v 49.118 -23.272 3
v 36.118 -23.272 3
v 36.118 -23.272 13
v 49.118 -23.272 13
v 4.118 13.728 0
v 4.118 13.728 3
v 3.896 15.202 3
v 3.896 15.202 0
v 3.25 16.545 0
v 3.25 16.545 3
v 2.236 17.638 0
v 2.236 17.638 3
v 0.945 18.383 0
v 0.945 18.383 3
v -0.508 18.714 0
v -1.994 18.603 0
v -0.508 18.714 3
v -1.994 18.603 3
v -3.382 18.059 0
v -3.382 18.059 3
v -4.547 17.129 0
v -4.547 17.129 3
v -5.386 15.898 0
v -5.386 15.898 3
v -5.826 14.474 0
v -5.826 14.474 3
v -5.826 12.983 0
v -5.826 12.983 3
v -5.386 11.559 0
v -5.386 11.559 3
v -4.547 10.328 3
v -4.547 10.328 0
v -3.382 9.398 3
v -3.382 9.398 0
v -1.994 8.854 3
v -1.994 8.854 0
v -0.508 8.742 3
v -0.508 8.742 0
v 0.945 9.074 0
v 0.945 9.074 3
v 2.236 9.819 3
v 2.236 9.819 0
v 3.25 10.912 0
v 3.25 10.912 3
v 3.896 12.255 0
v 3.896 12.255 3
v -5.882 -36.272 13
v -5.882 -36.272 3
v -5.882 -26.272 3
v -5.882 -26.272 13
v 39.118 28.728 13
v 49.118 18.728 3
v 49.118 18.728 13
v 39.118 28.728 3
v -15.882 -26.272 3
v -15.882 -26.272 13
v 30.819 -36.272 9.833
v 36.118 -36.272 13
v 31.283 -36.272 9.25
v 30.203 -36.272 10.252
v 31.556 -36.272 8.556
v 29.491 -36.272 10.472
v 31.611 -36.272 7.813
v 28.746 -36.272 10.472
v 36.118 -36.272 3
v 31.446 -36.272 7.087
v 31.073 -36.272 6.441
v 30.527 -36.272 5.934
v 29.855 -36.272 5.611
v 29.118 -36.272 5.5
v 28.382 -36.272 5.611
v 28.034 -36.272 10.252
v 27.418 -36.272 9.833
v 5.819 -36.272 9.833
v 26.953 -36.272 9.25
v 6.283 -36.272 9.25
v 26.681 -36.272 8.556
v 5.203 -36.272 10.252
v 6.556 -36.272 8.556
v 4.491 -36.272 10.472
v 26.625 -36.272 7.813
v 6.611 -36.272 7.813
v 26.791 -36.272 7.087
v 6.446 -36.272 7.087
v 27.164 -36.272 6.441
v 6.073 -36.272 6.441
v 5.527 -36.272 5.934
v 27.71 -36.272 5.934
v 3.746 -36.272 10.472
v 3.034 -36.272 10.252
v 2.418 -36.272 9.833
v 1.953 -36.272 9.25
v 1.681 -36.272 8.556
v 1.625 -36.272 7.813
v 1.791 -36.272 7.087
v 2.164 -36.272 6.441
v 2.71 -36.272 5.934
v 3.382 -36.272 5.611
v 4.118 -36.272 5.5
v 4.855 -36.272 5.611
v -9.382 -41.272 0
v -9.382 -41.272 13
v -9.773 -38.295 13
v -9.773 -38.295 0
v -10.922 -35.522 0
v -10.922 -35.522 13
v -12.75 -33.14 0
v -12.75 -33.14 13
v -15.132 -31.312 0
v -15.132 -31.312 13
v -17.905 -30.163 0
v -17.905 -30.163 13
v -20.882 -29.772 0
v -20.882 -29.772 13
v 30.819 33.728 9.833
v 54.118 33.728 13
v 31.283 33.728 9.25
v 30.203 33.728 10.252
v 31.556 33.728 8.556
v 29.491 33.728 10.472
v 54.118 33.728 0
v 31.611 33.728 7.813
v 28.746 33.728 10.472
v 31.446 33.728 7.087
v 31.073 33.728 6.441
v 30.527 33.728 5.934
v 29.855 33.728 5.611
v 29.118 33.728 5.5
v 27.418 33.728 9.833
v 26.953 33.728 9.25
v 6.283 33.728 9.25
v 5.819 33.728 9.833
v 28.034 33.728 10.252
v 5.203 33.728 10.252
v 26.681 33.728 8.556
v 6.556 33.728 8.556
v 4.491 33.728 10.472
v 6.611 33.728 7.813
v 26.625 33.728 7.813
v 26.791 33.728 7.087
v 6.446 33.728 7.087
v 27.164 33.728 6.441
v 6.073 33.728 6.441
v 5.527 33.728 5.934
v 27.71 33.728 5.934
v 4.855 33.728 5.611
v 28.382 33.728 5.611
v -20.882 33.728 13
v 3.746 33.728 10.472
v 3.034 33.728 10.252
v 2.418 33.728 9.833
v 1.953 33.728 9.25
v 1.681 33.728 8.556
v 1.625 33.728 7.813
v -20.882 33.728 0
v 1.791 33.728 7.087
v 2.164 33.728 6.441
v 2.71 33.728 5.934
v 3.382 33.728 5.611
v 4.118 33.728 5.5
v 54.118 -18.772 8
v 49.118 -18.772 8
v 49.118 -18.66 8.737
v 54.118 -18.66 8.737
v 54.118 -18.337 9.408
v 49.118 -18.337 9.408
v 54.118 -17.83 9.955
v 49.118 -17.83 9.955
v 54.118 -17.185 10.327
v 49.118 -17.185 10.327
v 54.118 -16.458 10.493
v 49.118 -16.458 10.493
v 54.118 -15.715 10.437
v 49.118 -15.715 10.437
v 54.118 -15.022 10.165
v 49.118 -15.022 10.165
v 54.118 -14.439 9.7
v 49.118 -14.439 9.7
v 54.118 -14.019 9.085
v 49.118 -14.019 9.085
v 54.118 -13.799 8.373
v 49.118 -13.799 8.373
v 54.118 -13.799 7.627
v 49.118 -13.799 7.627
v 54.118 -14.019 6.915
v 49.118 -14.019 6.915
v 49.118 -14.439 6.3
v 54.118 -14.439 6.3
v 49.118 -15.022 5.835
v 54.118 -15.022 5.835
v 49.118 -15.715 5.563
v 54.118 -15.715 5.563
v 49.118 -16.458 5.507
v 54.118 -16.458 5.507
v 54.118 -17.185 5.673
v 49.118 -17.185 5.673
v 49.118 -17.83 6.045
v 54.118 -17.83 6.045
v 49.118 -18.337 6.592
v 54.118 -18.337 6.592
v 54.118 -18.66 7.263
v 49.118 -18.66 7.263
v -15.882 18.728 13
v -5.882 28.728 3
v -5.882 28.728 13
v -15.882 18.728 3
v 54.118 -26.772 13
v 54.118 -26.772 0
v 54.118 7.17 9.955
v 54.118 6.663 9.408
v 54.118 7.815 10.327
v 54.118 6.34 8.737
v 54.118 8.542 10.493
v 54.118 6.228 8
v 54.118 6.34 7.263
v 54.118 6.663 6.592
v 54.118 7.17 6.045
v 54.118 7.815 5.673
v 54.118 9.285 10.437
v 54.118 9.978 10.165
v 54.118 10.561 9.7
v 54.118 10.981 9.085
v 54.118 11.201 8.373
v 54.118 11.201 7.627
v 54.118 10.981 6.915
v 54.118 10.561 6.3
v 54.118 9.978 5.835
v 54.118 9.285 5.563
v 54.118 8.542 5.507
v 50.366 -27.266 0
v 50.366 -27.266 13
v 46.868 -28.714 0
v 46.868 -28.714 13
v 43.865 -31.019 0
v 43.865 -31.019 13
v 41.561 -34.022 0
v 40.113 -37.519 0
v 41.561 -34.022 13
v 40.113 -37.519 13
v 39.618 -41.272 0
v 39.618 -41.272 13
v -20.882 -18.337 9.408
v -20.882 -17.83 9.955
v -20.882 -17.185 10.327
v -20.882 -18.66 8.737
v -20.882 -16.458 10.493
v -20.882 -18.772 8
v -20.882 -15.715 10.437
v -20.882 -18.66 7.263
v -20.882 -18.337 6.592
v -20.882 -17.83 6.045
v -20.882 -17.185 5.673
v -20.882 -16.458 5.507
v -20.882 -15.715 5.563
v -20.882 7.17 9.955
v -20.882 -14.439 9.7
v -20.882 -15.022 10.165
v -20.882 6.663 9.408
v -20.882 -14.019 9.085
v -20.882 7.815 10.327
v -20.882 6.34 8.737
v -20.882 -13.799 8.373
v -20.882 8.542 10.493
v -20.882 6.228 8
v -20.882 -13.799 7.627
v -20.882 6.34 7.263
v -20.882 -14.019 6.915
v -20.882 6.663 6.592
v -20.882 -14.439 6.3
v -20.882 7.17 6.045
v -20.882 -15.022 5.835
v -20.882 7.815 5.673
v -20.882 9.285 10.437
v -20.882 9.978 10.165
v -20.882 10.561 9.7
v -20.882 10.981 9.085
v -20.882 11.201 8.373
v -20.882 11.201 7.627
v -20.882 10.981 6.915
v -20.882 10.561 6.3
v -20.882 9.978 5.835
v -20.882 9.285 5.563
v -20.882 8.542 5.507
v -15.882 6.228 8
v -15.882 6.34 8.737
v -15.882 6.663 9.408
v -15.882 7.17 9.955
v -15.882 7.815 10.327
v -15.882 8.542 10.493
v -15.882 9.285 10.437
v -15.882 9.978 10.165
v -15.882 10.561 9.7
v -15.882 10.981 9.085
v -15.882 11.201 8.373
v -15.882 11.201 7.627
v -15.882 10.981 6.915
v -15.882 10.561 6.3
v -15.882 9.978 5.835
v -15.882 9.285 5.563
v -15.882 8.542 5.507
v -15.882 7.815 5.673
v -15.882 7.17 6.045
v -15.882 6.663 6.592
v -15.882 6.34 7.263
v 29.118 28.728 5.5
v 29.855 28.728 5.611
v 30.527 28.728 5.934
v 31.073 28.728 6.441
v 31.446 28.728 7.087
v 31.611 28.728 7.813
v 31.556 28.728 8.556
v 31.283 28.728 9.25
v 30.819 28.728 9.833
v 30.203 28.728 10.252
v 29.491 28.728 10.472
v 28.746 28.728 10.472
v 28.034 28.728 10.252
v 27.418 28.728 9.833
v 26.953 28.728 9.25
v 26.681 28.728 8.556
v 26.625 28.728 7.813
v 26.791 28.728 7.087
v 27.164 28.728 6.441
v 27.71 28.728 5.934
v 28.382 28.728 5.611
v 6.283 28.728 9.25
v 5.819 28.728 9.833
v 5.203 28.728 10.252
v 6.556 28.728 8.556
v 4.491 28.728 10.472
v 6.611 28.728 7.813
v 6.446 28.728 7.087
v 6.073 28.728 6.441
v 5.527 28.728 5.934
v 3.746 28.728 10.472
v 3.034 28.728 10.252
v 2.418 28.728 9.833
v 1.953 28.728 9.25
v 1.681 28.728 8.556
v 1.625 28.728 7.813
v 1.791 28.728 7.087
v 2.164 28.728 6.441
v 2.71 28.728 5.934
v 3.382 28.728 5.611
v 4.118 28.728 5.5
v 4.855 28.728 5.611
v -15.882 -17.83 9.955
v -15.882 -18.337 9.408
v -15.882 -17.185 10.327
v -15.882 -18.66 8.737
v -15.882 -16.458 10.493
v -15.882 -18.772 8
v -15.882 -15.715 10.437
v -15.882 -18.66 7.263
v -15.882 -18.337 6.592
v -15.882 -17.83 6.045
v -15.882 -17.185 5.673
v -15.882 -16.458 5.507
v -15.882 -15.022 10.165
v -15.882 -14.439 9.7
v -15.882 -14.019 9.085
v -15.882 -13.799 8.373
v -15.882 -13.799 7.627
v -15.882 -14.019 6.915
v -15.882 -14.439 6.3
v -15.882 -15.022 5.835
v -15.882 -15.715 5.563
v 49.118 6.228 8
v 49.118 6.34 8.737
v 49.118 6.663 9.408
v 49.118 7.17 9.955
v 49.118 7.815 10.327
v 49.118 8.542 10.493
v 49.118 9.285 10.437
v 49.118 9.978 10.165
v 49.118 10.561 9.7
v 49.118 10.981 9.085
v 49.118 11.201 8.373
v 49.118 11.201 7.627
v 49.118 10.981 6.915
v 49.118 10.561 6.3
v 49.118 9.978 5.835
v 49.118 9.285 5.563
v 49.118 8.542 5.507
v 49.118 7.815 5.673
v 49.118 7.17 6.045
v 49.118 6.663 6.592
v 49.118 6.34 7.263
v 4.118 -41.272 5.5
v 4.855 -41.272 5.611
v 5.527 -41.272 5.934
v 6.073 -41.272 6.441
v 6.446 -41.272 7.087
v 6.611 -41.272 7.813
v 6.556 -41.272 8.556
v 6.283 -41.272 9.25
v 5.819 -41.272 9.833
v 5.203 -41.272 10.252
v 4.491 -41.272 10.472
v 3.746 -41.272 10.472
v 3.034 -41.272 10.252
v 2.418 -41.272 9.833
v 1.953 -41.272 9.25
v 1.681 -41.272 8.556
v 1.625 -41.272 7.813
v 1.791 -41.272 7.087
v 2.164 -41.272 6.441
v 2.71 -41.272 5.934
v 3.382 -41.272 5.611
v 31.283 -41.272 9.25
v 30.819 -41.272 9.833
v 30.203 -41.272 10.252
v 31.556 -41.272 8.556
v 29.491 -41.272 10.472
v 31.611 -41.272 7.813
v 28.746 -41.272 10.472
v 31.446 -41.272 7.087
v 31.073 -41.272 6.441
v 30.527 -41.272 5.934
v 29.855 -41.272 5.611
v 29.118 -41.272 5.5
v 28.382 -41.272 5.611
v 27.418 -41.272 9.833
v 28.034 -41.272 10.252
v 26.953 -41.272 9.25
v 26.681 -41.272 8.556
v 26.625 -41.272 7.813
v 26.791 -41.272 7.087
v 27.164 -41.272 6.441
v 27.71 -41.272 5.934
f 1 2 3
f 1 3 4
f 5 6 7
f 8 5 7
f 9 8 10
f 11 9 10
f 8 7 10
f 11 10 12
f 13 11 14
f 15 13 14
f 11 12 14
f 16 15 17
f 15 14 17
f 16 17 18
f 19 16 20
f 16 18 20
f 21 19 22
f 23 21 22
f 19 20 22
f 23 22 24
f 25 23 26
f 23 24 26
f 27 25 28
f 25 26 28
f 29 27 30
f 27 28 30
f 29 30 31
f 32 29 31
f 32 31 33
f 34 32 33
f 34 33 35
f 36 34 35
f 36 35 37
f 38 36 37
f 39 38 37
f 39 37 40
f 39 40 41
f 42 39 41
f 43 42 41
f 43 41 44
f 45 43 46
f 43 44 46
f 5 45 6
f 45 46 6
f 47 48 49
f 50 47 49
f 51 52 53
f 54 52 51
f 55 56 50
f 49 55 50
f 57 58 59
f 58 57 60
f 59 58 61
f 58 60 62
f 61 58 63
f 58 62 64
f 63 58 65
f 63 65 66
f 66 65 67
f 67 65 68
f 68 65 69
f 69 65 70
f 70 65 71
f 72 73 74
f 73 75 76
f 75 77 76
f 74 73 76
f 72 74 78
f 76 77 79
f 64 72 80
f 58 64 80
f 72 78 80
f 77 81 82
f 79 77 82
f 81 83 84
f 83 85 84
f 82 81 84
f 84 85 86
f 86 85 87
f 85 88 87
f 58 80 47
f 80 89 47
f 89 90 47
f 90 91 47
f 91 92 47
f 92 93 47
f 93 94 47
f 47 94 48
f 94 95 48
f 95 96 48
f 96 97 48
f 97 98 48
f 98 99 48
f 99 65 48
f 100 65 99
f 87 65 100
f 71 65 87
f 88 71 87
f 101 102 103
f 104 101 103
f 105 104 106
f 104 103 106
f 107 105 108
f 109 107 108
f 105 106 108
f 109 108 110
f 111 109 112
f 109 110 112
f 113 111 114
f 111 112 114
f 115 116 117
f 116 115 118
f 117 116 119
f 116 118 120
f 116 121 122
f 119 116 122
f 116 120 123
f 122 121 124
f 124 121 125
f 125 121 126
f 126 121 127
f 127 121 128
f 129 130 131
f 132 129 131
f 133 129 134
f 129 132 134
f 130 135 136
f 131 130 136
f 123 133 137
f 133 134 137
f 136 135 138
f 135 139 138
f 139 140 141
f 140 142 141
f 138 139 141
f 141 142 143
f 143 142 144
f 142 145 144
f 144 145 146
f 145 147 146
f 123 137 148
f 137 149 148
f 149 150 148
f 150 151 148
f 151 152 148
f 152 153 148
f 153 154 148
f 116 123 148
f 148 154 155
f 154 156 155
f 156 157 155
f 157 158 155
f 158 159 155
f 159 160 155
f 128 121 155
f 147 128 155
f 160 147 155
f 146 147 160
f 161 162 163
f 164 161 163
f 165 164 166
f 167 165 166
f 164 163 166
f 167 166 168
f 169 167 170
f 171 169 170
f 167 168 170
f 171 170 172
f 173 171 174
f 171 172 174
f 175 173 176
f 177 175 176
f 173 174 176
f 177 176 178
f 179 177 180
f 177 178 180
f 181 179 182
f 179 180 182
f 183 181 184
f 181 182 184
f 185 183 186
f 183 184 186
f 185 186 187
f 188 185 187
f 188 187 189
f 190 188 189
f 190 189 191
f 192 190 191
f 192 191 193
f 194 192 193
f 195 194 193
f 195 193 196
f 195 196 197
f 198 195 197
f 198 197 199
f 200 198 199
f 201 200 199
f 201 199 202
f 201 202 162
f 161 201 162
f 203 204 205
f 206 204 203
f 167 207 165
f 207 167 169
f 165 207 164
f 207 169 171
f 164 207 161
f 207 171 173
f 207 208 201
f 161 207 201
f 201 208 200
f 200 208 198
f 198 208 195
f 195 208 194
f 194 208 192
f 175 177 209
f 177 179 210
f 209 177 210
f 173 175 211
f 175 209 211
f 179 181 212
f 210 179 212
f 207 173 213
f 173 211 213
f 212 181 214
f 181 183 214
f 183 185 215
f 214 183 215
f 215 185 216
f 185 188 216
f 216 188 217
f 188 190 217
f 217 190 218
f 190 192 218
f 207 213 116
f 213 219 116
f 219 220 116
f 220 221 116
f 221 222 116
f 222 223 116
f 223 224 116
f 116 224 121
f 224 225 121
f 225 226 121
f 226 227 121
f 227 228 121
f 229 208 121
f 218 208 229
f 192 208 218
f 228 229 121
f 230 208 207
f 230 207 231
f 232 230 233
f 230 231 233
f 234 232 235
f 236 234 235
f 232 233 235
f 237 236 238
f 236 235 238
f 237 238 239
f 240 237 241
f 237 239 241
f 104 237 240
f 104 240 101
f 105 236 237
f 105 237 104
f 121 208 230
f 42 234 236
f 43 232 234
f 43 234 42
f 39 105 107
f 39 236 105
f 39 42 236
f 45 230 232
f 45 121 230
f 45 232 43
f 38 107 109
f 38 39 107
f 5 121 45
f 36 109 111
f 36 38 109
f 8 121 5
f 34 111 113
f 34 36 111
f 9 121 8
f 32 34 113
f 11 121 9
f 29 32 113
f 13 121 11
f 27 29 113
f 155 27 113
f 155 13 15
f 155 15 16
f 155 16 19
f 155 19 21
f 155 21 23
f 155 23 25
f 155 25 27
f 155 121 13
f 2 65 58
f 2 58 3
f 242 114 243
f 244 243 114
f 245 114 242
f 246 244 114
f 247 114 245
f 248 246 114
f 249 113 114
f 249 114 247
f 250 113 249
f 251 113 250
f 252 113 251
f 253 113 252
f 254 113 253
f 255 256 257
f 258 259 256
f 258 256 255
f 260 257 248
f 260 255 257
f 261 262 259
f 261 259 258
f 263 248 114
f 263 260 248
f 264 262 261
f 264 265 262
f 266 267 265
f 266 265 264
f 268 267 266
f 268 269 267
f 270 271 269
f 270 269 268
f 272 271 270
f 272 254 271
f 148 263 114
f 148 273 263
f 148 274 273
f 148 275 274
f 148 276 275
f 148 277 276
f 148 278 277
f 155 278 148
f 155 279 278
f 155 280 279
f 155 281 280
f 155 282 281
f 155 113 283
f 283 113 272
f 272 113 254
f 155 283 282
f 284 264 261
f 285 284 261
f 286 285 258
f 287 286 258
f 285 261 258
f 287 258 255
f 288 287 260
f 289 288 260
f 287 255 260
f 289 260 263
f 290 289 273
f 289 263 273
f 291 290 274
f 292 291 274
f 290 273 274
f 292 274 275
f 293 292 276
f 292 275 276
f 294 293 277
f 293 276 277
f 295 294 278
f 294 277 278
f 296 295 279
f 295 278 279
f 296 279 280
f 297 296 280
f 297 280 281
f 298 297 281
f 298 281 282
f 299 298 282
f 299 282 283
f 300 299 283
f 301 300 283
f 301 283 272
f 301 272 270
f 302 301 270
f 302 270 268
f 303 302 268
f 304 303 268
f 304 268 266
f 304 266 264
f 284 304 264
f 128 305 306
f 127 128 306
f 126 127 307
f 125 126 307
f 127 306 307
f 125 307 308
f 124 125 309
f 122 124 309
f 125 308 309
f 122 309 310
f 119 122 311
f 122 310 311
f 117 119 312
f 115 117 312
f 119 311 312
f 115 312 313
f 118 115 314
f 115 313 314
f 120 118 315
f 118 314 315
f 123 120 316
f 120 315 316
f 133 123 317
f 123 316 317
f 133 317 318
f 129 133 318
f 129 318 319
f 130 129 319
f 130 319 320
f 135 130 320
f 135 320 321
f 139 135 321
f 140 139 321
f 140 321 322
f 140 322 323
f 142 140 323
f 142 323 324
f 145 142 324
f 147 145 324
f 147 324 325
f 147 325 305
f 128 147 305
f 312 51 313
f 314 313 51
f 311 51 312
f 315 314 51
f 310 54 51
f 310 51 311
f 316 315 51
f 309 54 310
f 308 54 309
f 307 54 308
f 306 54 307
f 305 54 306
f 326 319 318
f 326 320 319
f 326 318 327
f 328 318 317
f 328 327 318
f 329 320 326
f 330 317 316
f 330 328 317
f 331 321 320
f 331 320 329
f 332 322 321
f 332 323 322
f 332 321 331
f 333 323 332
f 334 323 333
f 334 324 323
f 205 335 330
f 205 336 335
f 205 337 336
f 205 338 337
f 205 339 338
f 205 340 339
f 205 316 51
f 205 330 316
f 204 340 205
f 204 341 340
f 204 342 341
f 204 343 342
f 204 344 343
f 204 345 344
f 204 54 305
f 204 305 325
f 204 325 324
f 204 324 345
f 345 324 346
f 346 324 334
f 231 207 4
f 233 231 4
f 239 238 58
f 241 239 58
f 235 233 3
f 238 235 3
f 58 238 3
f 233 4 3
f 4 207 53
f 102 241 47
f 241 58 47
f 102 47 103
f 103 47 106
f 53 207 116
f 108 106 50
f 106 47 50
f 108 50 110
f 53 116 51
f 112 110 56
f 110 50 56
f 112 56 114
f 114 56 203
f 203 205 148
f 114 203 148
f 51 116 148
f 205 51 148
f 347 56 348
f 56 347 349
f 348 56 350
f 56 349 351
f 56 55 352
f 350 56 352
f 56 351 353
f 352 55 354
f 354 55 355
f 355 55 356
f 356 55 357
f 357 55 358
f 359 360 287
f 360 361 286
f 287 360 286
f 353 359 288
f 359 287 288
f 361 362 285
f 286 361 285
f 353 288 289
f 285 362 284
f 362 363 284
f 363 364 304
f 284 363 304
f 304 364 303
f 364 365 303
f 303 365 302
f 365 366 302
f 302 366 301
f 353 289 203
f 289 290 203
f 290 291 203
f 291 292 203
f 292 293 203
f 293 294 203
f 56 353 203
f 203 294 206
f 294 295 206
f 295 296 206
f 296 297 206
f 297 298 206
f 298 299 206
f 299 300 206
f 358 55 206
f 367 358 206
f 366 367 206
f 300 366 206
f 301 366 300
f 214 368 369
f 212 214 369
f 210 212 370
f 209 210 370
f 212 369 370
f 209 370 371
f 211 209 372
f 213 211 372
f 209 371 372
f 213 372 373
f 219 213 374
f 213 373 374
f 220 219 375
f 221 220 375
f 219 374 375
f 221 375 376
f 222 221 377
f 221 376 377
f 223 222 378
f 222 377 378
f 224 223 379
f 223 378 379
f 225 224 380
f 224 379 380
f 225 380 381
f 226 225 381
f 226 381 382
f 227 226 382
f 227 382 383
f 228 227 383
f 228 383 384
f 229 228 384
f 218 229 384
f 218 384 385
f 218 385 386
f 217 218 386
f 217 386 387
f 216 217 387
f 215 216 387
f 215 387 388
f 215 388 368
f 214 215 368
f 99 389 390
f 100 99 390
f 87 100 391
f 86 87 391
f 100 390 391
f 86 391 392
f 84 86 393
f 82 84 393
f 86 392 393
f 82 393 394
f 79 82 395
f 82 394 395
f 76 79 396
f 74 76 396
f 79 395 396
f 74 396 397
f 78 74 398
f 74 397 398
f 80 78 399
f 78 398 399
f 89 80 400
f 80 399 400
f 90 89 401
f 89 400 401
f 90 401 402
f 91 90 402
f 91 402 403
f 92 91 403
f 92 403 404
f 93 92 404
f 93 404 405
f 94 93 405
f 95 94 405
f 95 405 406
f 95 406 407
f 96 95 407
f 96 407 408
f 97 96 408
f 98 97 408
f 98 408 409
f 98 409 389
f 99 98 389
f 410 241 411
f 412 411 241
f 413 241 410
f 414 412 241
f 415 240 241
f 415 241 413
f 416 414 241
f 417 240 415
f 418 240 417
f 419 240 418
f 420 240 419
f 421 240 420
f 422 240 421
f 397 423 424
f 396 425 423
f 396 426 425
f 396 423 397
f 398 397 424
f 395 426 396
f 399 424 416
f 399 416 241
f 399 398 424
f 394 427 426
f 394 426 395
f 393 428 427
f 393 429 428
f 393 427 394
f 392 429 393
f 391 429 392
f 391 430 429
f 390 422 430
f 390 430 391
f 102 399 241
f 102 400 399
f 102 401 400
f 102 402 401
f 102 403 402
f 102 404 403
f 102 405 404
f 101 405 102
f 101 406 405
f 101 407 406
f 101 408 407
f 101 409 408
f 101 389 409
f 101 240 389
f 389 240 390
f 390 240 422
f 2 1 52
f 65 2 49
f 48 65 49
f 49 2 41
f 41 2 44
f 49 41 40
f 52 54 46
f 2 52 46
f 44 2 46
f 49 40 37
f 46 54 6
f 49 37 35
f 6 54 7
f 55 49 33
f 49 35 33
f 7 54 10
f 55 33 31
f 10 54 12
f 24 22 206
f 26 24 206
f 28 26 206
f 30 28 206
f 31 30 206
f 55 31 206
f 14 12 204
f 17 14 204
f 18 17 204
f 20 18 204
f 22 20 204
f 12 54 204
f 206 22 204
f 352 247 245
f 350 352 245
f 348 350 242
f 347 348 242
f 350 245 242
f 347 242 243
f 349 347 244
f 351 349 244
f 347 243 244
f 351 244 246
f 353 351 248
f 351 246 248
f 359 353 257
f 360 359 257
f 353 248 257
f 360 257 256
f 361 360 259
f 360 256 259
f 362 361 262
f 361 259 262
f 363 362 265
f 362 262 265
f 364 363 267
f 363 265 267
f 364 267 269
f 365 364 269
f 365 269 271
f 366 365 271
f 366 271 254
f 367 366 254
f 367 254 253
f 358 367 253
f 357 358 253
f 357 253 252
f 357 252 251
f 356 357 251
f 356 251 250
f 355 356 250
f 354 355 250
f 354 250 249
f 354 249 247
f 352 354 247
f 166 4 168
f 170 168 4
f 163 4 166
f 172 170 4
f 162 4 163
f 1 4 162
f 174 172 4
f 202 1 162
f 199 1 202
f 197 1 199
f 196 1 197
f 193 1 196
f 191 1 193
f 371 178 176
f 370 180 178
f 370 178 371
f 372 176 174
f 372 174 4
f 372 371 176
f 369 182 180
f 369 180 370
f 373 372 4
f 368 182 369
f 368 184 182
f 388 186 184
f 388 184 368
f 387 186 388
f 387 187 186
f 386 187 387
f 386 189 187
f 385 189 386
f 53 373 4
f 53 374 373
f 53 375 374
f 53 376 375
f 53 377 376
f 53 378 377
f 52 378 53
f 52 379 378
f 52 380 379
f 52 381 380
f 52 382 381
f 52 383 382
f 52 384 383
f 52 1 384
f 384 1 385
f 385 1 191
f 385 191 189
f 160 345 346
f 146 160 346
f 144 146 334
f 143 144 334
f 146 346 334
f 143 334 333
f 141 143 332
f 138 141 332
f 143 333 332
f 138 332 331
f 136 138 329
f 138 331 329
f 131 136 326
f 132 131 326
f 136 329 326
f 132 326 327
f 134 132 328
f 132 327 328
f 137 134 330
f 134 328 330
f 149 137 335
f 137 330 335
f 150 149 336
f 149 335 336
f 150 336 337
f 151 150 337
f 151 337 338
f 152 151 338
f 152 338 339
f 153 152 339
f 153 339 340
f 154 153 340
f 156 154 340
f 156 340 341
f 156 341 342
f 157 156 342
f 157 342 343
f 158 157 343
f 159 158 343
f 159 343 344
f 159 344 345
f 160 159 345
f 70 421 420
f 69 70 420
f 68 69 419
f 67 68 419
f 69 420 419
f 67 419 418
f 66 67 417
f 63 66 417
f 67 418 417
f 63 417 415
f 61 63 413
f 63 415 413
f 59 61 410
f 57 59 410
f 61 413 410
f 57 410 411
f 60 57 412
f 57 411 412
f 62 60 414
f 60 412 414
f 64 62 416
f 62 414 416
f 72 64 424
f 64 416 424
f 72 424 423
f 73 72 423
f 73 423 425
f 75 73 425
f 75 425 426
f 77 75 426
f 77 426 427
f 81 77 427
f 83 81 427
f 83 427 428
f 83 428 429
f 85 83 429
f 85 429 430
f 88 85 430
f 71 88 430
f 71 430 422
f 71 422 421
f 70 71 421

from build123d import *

# Parameters (mm, degrees)
BOSS_EXTRU_1_DEPTH        = 13
COQUE1_T                  = -5
COQUE1_THICKNESS_2_FACE_W = 65
COQUE1_THICKNESS_2_FACE_H = 65
COQUE1_THICKNESS_2_DEPTH  = 2
ENL_V_MAT_EXTRU_1_REACH   = 88.587
ESQUISSE2_R               = 2.5
ENL_V_MAT_EXTRU_2_REACH   = 95.396
ESQUISSE3_R               = 2.5
ESQUISSE4_W               = 18
ESQUISSE4_H               = 18
ESQUISSE4_W_2             = 15
ESQUISSE4_H_2             = 15
BOSS_EXTRU_2_DEPTH        = 10
ESQUISSE5_R               = 11.5
ESQUISSE5_R_2             = 14.5
ENL_V_MAT_EXTRU_3_DEPTH   = 13
ESQUISSE6_R               = 5
ENL_V_MAT_EXTRU_4_DEPTH   = 3


with BuildPart() as part:
    # Esquisse1 → Boss.-Extru.1 (new body)
    with BuildSketch(Plane.XY):
        Polygon((44.118436308, 33.728448276), (54.118436308, 33.728448276), (54.118436308, 23.728448276), (54.118436308, -41.271551724), (-20.881563692, -41.271551724), (-20.881563692, 33.728448276), align=None)
    extrude(amount=BOSS_EXTRU_1_DEPTH)

    # Coque1
    coque1_openings = [part.faces().sort_by_distance(p)[0] for p in [
        (16.618436308, -3.771551724, 13),
    ]]
    offset(amount=COQUE1_T, openings=coque1_openings, kind=Kind.INTERSECTION)

    # Coque1 thickness 2 face (on inner face of the shell) → Coque1 thickness 2 (cut)
    with BuildSketch(Plane(origin=(16.618436308, -3.771551724, 5), x_dir=(-1, 0, 0), z_dir=(0, 0, -1))):
        Rectangle(COQUE1_THICKNESS_2_FACE_W, COQUE1_THICKNESS_2_FACE_H)
    extrude(amount=COQUE1_THICKNESS_2_DEPTH, mode=Mode.SUBTRACT)

    # Enlèv. mat.-Extru.1: up to this face of the body (flat: up to its plane)
    enl_v_mat_extru_1_end = Plane(part.part.faces().sort_by_distance((54.118436308, -3.771551724, 6.5))[0])
    # Esquisse2 → Enlèv. mat.-Extru.1 (cut, up to the picked face)
    with BuildSketch(Plane.ZY.offset(20.881563692), mode=Mode.PRIVATE) as enl_v_mat_extru_1_sk1:
        with Locations(Location((8, -16.271551724, 0), (0, 0, 270))):
            Circle(ESQUISSE2_R)
    enl_v_mat_extru_1_tool1 = split(extrude(enl_v_mat_extru_1_sk1.sketch, amount=-ENL_V_MAT_EXTRU_1_REACH, mode=Mode.PRIVATE), bisect_by=enl_v_mat_extru_1_end, keep=Keep.BOTH, mode=Mode.PRIVATE)
    # Esquisse2 → Enlèv. mat.-Extru.1 (cut, up to the picked face)
    with BuildSketch(Plane.ZY.offset(20.881563692), mode=Mode.PRIVATE) as enl_v_mat_extru_1_sk2:
        with Locations(Location((8, 8.728448276, 0), (0, 0, 270))):
            Circle(ESQUISSE2_R)
    enl_v_mat_extru_1_tool2 = split(extrude(enl_v_mat_extru_1_sk2.sketch, amount=-ENL_V_MAT_EXTRU_1_REACH, mode=Mode.PRIVATE), bisect_by=enl_v_mat_extru_1_end, keep=Keep.BOTH, mode=Mode.PRIVATE)
    add(enl_v_mat_extru_1_tool1.solids().sort_by(Axis((-20.881564, -16.271552, 8), (1, 0, 0)))[0], mode=Mode.SUBTRACT)
    add(enl_v_mat_extru_1_tool2.solids().sort_by(Axis((-20.881564, 8.728448, 8), (1, 0, 0)))[0], mode=Mode.SUBTRACT)

    # Enlèv. mat.-Extru.2: up to this face of the body (flat: up to its plane)
    enl_v_mat_extru_2_end = Plane(part.part.faces().sort_by_distance((16.618436308, 33.728448276, 6.5))[0])
    # Esquisse3 → Enlèv. mat.-Extru.2 (cut, up to the picked face)
    with BuildSketch(Plane.XZ.offset(41.271551724), mode=Mode.PRIVATE) as enl_v_mat_extru_2_sk1:
        with Locations(Location((4.118436308, 8, 0), (0, 0, 270))):
            Circle(ESQUISSE3_R)
    enl_v_mat_extru_2_tool1 = split(extrude(enl_v_mat_extru_2_sk1.sketch, amount=-ENL_V_MAT_EXTRU_2_REACH, mode=Mode.PRIVATE), bisect_by=enl_v_mat_extru_2_end, keep=Keep.BOTH, mode=Mode.PRIVATE)
    # Esquisse3 → Enlèv. mat.-Extru.2 (cut, up to the picked face)
    with BuildSketch(Plane.XZ.offset(41.271551724), mode=Mode.PRIVATE) as enl_v_mat_extru_2_sk2:
        with Locations(Location((29.118436308, 8, 0), (0, 0, 270))):
            Circle(ESQUISSE3_R)
    enl_v_mat_extru_2_tool2 = split(extrude(enl_v_mat_extru_2_sk2.sketch, amount=-ENL_V_MAT_EXTRU_2_REACH, mode=Mode.PRIVATE), bisect_by=enl_v_mat_extru_2_end, keep=Keep.BOTH, mode=Mode.PRIVATE)
    add(enl_v_mat_extru_2_tool1.solids().sort_by(Axis((4.118436, -41.271552, 8), (0, 1, 0)))[0], mode=Mode.SUBTRACT)
    add(enl_v_mat_extru_2_tool2.solids().sort_by(Axis((29.118436, -41.271552, 8), (0, 1, 0)))[0], mode=Mode.SUBTRACT)

    # Esquisse4 → Boss.-Extru.2 (add)
    with BuildSketch(Plane.XY.offset(3)):
        Polygon((-5.881563692, 28.728448276), (-15.881563692, 18.728448276), (-15.881563692, 28.728448276), align=None)
        Polygon((49.118436308, 28.728448276), (49.118436308, 18.728448276), (39.118436308, 28.728448276), align=None)
        with Locations((45.118436308, -32.271551724)):
            Rectangle(ESQUISSE4_W, ESQUISSE4_H)
        with Locations((-13.381563692, -33.771551724)):
            Rectangle(ESQUISSE4_W_2, ESQUISSE4_H_2)
    extrude(amount=BOSS_EXTRU_2_DEPTH)

    # Esquisse5 → Enlèv. mat.-Extru.3 (cut)
    with BuildSketch(Plane.XY.offset(13)):
        with Locations((-20.881563692, -41.271551724)):
            Circle(ESQUISSE5_R)
        with Locations((54.118436308, -41.271551724)):
            Circle(ESQUISSE5_R_2)
    extrude(amount=-ENL_V_MAT_EXTRU_3_DEPTH, mode=Mode.SUBTRACT)

    # Esquisse6 → Enlèv. mat.-Extru.4 (cut)
    with BuildSketch(Plane.XY.offset(3)):
        with Locations((-0.881563692, 13.728448276)):
            Circle(ESQUISSE6_R)
    extrude(amount=-ENL_V_MAT_EXTRU_4_DEPTH, mode=Mode.SUBTRACT)


solid = part.part
